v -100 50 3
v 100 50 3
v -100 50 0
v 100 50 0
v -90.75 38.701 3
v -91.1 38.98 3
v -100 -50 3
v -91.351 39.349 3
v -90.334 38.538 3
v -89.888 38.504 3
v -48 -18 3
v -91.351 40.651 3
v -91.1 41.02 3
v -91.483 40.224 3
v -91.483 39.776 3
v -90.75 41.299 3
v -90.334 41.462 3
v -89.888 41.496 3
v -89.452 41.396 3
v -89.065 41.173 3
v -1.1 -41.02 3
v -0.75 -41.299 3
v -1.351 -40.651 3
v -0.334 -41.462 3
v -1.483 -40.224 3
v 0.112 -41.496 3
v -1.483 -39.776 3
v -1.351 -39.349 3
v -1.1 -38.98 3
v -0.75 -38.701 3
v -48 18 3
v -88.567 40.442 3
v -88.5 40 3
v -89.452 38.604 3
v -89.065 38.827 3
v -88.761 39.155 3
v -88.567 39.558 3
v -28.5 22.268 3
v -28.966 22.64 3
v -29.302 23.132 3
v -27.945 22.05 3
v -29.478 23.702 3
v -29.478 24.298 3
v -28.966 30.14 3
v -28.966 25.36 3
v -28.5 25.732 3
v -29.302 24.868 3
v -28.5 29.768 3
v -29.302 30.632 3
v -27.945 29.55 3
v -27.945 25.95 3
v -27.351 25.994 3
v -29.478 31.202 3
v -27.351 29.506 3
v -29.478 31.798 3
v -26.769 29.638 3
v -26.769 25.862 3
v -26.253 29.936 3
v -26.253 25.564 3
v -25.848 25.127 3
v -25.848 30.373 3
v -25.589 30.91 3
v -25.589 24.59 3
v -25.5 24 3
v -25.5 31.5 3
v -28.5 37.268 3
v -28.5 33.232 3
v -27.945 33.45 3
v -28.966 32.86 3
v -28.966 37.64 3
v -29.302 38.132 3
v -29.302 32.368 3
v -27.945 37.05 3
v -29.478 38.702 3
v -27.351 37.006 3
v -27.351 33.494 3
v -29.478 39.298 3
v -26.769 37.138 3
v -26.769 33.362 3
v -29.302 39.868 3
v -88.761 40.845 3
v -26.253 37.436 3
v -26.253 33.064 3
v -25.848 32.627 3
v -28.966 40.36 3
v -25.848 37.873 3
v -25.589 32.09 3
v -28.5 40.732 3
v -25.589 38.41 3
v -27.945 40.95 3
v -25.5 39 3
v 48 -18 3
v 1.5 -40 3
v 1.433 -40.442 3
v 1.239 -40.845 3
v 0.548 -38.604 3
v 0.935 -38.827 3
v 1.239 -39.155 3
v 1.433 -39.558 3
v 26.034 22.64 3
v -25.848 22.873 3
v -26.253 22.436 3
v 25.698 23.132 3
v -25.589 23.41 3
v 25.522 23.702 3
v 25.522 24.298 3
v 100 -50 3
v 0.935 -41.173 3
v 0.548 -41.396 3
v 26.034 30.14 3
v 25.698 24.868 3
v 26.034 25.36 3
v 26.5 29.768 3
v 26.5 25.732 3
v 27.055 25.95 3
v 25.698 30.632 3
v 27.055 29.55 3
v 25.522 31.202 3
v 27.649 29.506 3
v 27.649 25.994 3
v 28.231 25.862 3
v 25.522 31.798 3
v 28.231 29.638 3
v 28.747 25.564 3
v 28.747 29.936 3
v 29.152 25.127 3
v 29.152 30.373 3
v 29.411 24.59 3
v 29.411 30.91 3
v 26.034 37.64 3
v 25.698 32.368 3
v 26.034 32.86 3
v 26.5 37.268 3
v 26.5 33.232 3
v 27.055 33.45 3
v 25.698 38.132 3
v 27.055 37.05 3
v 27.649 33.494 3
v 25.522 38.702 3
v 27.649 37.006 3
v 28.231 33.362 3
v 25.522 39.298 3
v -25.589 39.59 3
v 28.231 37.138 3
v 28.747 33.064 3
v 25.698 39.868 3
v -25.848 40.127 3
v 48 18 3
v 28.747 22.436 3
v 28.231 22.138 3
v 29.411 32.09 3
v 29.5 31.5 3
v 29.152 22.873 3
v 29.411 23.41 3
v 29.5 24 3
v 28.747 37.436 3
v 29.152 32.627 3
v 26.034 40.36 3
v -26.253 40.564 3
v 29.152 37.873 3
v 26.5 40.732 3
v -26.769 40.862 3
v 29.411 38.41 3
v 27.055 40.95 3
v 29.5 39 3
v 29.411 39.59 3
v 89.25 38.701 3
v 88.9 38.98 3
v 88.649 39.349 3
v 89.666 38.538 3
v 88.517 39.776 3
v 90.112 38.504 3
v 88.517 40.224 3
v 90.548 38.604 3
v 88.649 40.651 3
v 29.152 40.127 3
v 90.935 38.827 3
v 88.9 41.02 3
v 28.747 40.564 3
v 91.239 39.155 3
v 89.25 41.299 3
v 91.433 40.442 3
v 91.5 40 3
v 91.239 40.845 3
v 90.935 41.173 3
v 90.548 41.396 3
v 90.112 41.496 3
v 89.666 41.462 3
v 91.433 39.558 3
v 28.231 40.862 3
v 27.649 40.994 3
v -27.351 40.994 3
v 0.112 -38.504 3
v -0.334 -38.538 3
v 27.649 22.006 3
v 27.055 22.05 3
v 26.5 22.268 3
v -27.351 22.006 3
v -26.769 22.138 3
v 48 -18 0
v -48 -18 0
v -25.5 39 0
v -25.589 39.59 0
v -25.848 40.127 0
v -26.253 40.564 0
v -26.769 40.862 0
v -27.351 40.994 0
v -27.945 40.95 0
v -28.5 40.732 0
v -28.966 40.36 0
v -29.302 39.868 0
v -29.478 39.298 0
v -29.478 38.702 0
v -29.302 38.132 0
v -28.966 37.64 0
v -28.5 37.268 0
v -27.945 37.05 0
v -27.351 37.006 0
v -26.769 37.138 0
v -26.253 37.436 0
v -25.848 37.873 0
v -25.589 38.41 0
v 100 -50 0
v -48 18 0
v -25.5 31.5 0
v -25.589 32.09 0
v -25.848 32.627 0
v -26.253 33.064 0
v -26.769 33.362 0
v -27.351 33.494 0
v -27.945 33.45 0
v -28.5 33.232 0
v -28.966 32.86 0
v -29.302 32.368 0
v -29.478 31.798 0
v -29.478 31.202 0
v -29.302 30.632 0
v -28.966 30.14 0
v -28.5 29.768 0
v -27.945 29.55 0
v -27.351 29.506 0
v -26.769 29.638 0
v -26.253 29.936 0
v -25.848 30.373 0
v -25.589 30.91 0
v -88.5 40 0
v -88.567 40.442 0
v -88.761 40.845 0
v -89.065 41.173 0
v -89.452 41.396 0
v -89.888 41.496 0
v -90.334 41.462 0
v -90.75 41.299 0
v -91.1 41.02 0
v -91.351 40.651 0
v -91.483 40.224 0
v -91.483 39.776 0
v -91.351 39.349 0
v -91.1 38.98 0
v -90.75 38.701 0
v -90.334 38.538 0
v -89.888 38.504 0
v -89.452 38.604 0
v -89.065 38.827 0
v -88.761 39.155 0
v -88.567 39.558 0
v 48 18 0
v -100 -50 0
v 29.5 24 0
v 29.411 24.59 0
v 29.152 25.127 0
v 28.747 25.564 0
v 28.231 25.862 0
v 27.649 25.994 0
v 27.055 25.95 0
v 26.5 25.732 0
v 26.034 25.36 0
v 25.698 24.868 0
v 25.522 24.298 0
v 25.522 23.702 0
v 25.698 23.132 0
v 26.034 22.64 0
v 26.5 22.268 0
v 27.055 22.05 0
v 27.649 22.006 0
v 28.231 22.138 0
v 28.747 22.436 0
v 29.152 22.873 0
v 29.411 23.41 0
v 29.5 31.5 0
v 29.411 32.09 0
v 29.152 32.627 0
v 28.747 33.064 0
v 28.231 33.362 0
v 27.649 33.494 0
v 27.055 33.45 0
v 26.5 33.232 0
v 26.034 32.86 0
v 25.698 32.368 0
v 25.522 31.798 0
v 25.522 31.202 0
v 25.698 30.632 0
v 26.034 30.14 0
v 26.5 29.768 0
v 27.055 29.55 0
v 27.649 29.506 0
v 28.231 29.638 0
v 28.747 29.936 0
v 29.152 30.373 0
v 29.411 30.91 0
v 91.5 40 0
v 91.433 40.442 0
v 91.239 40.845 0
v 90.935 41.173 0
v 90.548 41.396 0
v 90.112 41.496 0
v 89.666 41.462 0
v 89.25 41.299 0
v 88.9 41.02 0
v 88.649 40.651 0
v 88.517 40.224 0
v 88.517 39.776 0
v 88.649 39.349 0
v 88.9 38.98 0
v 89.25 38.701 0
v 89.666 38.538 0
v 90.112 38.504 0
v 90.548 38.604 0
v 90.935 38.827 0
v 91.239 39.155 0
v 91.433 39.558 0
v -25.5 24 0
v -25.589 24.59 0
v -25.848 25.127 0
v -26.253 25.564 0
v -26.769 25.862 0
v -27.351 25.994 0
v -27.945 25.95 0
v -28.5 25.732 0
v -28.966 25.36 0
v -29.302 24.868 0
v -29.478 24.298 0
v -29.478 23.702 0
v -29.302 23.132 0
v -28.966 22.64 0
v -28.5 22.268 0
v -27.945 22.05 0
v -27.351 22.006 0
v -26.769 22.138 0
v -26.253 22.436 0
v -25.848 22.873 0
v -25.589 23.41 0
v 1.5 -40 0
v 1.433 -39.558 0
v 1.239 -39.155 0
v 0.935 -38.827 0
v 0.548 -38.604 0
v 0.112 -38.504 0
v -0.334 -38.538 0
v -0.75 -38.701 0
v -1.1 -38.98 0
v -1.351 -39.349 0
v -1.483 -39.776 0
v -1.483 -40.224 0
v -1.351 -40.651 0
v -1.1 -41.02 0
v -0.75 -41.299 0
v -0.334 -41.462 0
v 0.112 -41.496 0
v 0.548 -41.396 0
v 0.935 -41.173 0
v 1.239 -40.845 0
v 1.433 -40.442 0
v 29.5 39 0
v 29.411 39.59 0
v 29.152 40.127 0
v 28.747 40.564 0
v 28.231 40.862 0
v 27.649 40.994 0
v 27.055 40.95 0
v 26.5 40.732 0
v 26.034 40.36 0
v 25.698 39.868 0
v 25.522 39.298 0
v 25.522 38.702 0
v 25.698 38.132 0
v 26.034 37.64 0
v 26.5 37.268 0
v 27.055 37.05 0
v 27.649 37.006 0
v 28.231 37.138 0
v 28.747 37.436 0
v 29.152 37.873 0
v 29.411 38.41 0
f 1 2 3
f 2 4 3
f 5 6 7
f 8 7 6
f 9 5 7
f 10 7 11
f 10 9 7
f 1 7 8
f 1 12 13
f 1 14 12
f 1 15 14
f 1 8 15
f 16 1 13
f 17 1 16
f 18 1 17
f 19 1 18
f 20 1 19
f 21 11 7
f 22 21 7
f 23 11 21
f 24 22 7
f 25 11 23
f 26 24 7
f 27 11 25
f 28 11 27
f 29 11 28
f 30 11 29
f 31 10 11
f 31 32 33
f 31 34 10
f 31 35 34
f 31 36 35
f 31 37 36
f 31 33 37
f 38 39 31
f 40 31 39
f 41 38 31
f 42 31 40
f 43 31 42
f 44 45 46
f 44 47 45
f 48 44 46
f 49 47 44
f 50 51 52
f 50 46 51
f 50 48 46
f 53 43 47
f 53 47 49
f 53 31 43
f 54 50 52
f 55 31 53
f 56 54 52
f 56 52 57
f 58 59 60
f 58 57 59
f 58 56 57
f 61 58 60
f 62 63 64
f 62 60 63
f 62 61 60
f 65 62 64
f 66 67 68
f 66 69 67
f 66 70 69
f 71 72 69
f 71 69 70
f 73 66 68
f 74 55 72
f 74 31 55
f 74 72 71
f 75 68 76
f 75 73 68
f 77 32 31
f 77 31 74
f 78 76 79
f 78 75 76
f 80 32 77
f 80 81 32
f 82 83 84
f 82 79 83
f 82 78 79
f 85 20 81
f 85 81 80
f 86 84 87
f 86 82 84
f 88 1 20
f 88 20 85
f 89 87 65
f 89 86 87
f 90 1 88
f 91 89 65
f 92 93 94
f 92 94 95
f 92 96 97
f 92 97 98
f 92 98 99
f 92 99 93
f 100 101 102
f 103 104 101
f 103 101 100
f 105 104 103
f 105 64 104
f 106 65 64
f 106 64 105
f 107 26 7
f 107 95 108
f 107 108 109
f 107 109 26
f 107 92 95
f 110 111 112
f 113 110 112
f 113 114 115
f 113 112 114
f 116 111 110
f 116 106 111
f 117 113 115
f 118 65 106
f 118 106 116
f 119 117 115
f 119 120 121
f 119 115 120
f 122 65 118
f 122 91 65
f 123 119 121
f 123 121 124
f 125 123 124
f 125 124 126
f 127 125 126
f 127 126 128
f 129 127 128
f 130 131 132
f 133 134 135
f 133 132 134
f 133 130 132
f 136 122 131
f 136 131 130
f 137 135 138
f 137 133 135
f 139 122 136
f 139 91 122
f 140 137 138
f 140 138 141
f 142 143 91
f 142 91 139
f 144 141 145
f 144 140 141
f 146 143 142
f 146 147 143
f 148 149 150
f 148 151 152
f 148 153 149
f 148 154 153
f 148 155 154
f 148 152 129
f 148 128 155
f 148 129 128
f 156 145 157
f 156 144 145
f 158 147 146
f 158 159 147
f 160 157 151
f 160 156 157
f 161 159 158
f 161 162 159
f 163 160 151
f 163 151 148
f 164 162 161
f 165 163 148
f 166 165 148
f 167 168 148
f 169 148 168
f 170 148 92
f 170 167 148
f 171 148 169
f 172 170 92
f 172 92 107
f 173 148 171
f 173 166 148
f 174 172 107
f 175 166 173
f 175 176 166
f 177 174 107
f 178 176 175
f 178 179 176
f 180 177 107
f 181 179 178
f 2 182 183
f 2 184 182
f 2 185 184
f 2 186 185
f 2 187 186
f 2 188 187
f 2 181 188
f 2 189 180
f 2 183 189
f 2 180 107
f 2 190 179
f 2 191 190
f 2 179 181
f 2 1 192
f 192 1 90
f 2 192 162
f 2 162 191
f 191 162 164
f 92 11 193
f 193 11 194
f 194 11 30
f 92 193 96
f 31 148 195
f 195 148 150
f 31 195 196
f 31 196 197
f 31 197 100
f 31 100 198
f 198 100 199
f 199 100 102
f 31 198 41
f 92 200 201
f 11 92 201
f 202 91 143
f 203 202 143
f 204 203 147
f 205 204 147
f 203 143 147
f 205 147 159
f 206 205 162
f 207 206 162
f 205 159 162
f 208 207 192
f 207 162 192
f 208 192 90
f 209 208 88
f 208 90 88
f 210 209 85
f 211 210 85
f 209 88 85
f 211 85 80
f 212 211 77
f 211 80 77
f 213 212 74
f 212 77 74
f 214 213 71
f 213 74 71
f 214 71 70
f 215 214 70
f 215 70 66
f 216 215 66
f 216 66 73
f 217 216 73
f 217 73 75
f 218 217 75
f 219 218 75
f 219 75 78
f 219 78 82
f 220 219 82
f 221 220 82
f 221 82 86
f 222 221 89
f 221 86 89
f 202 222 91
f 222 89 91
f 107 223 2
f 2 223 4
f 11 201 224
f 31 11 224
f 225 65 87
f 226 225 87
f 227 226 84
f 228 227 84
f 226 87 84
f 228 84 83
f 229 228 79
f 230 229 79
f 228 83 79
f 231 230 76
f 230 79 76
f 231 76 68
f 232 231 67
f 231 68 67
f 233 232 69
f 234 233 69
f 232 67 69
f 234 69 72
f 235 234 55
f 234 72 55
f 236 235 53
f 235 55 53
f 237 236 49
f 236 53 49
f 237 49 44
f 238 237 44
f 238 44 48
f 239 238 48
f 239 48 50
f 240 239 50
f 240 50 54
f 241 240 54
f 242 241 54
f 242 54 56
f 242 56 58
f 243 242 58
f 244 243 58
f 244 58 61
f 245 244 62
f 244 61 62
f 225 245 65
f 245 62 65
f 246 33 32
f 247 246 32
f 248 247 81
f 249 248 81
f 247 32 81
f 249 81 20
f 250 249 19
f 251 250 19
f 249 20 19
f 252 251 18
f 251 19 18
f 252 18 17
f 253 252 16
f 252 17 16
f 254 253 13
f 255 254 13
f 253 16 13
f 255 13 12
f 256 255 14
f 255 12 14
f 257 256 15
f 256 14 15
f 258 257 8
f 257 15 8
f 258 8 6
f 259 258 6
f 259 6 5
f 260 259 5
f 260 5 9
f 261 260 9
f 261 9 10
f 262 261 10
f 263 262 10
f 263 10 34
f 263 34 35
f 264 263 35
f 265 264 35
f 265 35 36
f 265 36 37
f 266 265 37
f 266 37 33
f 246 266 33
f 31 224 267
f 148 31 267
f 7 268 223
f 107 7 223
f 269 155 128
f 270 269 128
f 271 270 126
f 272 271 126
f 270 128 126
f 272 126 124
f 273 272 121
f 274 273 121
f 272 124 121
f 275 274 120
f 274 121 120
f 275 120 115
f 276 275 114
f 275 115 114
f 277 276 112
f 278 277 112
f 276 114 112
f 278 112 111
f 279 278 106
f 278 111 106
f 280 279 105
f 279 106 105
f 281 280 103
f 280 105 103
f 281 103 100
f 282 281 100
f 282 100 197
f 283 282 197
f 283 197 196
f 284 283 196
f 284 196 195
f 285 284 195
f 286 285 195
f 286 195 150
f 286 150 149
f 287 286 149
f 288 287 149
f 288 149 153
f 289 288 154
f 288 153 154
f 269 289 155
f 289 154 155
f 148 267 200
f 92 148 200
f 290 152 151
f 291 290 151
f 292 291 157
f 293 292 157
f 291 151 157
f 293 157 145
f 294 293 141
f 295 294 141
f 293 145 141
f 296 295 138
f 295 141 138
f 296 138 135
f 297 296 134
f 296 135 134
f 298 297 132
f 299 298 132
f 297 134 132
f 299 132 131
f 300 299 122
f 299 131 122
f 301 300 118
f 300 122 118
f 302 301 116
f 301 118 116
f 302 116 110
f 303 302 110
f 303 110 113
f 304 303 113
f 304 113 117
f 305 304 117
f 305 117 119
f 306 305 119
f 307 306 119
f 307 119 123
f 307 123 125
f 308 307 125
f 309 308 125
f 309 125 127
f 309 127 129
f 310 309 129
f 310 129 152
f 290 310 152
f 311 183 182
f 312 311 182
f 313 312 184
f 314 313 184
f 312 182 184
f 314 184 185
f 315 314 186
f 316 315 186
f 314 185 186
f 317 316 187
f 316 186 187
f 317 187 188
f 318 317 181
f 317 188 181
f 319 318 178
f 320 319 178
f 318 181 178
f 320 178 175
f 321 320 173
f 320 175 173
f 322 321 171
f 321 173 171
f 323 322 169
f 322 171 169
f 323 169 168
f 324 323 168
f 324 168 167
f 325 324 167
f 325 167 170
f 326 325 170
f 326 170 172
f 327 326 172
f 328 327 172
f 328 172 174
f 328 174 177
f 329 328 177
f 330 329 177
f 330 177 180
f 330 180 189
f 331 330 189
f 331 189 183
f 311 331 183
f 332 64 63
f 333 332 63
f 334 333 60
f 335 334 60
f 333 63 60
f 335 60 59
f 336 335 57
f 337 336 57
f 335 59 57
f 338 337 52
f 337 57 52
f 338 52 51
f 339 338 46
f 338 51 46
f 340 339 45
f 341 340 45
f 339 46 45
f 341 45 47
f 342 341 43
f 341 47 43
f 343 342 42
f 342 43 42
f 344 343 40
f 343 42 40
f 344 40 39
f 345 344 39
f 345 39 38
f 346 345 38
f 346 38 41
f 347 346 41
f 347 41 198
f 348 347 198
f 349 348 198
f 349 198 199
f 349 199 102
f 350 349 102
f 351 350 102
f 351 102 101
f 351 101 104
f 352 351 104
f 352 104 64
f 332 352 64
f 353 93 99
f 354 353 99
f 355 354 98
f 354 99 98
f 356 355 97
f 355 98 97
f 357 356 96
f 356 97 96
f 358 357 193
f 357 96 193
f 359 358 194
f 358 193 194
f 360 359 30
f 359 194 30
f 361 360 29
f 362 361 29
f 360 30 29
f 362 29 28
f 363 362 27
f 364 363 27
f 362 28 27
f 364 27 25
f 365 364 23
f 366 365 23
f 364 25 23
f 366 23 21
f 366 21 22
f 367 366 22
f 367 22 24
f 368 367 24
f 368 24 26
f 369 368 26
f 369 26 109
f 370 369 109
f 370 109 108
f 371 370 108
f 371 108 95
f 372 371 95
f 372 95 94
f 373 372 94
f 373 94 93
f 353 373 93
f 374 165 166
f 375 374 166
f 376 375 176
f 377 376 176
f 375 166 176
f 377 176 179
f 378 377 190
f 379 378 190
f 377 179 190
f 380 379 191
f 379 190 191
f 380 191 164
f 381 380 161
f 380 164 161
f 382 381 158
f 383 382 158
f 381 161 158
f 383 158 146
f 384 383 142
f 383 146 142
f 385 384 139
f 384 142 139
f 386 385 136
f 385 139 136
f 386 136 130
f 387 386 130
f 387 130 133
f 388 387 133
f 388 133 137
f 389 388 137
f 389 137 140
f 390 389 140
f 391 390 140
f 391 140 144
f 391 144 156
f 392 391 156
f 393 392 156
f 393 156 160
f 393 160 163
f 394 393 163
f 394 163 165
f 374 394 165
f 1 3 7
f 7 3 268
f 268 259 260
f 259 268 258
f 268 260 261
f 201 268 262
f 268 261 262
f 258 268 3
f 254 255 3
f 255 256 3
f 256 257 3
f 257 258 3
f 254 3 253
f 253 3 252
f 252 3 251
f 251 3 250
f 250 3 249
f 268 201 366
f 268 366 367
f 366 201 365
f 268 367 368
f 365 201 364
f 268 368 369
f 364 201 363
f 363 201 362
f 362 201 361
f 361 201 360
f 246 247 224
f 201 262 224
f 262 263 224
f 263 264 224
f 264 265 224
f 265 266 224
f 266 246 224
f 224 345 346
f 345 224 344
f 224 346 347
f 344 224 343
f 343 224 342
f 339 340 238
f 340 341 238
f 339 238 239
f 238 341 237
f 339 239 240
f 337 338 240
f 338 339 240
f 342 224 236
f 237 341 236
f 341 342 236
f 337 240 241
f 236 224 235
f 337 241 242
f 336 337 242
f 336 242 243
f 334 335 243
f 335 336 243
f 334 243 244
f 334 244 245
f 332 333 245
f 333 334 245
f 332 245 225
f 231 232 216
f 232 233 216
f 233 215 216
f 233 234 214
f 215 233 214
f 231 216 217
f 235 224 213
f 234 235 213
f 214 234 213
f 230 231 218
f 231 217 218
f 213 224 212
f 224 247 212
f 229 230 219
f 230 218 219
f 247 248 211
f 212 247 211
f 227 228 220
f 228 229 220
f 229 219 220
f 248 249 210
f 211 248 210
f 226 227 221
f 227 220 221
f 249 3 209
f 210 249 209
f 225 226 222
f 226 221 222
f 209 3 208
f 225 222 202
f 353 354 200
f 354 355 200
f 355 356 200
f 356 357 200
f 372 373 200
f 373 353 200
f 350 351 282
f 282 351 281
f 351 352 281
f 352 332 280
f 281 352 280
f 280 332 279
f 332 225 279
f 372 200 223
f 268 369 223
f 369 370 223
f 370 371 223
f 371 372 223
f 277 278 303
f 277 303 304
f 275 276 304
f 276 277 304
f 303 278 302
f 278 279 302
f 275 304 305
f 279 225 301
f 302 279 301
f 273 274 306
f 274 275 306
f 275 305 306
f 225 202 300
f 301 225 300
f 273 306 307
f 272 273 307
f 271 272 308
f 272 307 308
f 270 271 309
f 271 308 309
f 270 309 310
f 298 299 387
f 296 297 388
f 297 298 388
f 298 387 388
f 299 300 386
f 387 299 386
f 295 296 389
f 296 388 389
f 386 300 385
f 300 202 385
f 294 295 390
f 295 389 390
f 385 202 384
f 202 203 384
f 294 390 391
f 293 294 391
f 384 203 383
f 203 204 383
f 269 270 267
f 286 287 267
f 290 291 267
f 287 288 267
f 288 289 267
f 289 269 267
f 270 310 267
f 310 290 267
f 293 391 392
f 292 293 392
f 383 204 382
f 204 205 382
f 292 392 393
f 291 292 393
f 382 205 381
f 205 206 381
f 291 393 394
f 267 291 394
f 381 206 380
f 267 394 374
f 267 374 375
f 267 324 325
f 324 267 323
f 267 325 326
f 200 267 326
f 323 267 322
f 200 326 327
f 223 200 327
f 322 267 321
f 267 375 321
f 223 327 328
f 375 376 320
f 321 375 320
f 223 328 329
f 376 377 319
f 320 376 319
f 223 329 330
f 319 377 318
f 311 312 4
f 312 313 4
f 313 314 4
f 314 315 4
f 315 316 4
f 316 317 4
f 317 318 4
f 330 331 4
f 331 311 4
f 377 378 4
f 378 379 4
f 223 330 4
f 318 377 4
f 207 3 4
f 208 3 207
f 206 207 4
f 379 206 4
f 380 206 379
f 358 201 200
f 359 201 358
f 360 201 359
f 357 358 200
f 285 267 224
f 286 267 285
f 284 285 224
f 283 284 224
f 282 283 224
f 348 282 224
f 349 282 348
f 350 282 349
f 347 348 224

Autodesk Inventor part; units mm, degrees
ref_plane "YZ Plane" through (0, 0, 0) normal (1, 0, 0) x (0, 1, 0)
ref_plane "XZ Plane" through (0, 0, 0) normal (0, 1, 0) x (-1, 0, 0)
ref_plane "XY Plane" through (0, 0, 0) normal (0, 0, 1) x (1, 0, 0)
sketch "Эскиз1" plane through (0, 0, 0) normal (0, 0, 1) x (1, 0, 0)
  line L0 (-100, -50) -> (100, -50)
  line L1 (100, -50) -> (100, 50)
  line L2 (100, 50) -> (-100, 50)
  line L3 (-100, 50) -> (-100, -50)
  line L4 (-100, -50) -> (100, 50) construction
  line L5 (100, -50) -> (-100, 50) construction
  line L6 (-45, -15) -> (45, -15) construction
  line L7 (45, -15) -> (45, 15) construction
  line L8 (45, 15) -> (-45, 15) construction
  line L9 (-45, 15) -> (-45, -15) construction
  line L10 (-45, -15) -> (45, 15) construction
  line L11 (45, -15) -> (-45, 15) construction
  line L12 (0, 15) -> (0, 18) construction
  line L13 (-45, 15) -> (-48, 15) construction
  line L14 (48, -18) -> (-48, -18)
  line L15 (-48, -18) -> (-48, 18)
  line L16 (-48, 18) -> (48, 18)
  line L17 (48, 18) -> (48, -18)
  line L18 (48, -18) -> (-48, 18) construction
  line L19 (-48, -18) -> (48, 18) construction
  point P0 (0, 0)
  dimension "d0" = 200
  dimension "d1" = 100
  dimension "d2" = 90
  dimension "d3" = 30
  dimension "d4" = 3
  dimension "d5" = 3
extrude "Выдавливание1" add sketch "Эскиз1" along normal blind 3
ref_plane "РабПлоскость1" through (0, -50, 0) normal (1, 0, 0) x (0, 0, -1)
sketch "Эскиз2" plane through (0, 0, 3) normal (0, 0, 1) x (1, 0, 0)
  line L0 (-48, -18) -> (-48, 18) projected
  line L1 (-48, 18) -> (48, 18) projected
  line L2 (48, 18) -> (48, -18) projected
  line L3 (48, -18) -> (-48, -18) projected
  line L4 (-100, -50) -> (100, -50) projected
  line L5 (100, -50) -> (100, 50) projected
  line L6 (100, 50) -> (-100, 50) projected
  line L7 (-100, 50) -> (-100, -50) projected
  line L8 (48, 18) -> (33.5, 18) construction
  line L9 (33.5, 18) -> (33.5, 50) construction
  line L10 (33.5, 18) -> (27.5, 18) construction
  line L11 (48, 18) -> (-48, 18) construction
  line L12 (27.5, 18) -> (27.5, 50) construction
  line L13 (100, 50) -> (-100, 50) construction
  line L14 (27.5, 18) -> (27.5, 24) construction
  circle A0 centre (27.5, 24) radius 2
  circle A1 centre (27.5, 31.5) radius 2
  circle A2 centre (27.5, 39) radius 2
  line L15 (0, 18) -> (0, 50)
  line L16 (-33.5, 18) -> (-27.5, 18) construction
  line L17 (-27.5, 18) -> (-27.5, 24) construction
  circle A3 centre (-27.5, 24) radius 2
  circle A4 centre (-27.5, 31.5) radius 2
  circle A5 centre (-27.5, 39) radius 2
  point P0 (0, 0)
  dimension "d8" = 14.5
  dimension "d9" = 6
  dimension "d10" = 6
  dimension "d11" = 4
  dimension "d14" = 7.5
extrude "Выдавливание2" cut sketch "Эскиз2" against normal blind 10 contours A0 | A1 | A2 | A3 | A4 | A5
sketch "Эскиз3" plane through (0, 0, 3) normal (0, 0, 1) x (1, 0, 0)
  circle A0 centre (-27.5, 31.5) radius 2 projected
  circle A1 centre (27.5, 39) radius 2 projected
  circle A2 centre (27.5, 24) radius 2 projected
  circle A3 centre (27.5, 31.5) radius 2 projected
  circle A4 centre (-27.5, 24) radius 2 projected
  circle A5 centre (-27.5, 39) radius 2 projected
  line L0 (-48, -18) -> (-48, 18) projected
  line L1 (-48, 18) -> (48, 18) projected
  line L2 (48, 18) -> (48, -18) projected
  line L3 (48, -18) -> (-48, -18) projected
  line L4 (-100, -50) -> (100, -50) projected
  line L5 (100, -50) -> (100, 50) projected
  line L6 (100, 50) -> (-100, 50) projected
  line L7 (-100, 50) -> (-100, -50) projected
  line L8 (-100, 50) -> (-90, 50) construction
  line L9 (-90, 50) -> (-90, 40) construction
  line L10 (-90, 40) -> (-100, 40) construction
  line L11 (-100, 40) -> (-100, 50) construction
  circle A6 centre (-90, 40) radius 1.5
  line L12 (-100, 50) -> (-100, -50) projected
  line L13 (-100, 0) -> (100, 0)
  line L14 (100, -50) -> (100, 50) projected
  line L15 (100, 50) -> (-100, 50) projected
  line L16 (0, 50) -> (0, -50)
  line L17 (-100, -50) -> (100, -50) projected
  circle A7 centre (90, 40) radius 1.5
  line L18 (0, -50) -> (0, -40) construction
  circle A8 centre (0, -40) radius 1.5
  point P0 (0, 0)
  dimension "d21" = 10
  dimension "d22" = 10
  dimension "d23" = 3
  dimension "d24" = 10
  dimension "d25" = 3
extrude "Выдавливание3" cut sketch "Эскиз3" against normal blind 10 contours A8 L16 | L16 A8 | A6 | A7
properties part number "Up Base"
